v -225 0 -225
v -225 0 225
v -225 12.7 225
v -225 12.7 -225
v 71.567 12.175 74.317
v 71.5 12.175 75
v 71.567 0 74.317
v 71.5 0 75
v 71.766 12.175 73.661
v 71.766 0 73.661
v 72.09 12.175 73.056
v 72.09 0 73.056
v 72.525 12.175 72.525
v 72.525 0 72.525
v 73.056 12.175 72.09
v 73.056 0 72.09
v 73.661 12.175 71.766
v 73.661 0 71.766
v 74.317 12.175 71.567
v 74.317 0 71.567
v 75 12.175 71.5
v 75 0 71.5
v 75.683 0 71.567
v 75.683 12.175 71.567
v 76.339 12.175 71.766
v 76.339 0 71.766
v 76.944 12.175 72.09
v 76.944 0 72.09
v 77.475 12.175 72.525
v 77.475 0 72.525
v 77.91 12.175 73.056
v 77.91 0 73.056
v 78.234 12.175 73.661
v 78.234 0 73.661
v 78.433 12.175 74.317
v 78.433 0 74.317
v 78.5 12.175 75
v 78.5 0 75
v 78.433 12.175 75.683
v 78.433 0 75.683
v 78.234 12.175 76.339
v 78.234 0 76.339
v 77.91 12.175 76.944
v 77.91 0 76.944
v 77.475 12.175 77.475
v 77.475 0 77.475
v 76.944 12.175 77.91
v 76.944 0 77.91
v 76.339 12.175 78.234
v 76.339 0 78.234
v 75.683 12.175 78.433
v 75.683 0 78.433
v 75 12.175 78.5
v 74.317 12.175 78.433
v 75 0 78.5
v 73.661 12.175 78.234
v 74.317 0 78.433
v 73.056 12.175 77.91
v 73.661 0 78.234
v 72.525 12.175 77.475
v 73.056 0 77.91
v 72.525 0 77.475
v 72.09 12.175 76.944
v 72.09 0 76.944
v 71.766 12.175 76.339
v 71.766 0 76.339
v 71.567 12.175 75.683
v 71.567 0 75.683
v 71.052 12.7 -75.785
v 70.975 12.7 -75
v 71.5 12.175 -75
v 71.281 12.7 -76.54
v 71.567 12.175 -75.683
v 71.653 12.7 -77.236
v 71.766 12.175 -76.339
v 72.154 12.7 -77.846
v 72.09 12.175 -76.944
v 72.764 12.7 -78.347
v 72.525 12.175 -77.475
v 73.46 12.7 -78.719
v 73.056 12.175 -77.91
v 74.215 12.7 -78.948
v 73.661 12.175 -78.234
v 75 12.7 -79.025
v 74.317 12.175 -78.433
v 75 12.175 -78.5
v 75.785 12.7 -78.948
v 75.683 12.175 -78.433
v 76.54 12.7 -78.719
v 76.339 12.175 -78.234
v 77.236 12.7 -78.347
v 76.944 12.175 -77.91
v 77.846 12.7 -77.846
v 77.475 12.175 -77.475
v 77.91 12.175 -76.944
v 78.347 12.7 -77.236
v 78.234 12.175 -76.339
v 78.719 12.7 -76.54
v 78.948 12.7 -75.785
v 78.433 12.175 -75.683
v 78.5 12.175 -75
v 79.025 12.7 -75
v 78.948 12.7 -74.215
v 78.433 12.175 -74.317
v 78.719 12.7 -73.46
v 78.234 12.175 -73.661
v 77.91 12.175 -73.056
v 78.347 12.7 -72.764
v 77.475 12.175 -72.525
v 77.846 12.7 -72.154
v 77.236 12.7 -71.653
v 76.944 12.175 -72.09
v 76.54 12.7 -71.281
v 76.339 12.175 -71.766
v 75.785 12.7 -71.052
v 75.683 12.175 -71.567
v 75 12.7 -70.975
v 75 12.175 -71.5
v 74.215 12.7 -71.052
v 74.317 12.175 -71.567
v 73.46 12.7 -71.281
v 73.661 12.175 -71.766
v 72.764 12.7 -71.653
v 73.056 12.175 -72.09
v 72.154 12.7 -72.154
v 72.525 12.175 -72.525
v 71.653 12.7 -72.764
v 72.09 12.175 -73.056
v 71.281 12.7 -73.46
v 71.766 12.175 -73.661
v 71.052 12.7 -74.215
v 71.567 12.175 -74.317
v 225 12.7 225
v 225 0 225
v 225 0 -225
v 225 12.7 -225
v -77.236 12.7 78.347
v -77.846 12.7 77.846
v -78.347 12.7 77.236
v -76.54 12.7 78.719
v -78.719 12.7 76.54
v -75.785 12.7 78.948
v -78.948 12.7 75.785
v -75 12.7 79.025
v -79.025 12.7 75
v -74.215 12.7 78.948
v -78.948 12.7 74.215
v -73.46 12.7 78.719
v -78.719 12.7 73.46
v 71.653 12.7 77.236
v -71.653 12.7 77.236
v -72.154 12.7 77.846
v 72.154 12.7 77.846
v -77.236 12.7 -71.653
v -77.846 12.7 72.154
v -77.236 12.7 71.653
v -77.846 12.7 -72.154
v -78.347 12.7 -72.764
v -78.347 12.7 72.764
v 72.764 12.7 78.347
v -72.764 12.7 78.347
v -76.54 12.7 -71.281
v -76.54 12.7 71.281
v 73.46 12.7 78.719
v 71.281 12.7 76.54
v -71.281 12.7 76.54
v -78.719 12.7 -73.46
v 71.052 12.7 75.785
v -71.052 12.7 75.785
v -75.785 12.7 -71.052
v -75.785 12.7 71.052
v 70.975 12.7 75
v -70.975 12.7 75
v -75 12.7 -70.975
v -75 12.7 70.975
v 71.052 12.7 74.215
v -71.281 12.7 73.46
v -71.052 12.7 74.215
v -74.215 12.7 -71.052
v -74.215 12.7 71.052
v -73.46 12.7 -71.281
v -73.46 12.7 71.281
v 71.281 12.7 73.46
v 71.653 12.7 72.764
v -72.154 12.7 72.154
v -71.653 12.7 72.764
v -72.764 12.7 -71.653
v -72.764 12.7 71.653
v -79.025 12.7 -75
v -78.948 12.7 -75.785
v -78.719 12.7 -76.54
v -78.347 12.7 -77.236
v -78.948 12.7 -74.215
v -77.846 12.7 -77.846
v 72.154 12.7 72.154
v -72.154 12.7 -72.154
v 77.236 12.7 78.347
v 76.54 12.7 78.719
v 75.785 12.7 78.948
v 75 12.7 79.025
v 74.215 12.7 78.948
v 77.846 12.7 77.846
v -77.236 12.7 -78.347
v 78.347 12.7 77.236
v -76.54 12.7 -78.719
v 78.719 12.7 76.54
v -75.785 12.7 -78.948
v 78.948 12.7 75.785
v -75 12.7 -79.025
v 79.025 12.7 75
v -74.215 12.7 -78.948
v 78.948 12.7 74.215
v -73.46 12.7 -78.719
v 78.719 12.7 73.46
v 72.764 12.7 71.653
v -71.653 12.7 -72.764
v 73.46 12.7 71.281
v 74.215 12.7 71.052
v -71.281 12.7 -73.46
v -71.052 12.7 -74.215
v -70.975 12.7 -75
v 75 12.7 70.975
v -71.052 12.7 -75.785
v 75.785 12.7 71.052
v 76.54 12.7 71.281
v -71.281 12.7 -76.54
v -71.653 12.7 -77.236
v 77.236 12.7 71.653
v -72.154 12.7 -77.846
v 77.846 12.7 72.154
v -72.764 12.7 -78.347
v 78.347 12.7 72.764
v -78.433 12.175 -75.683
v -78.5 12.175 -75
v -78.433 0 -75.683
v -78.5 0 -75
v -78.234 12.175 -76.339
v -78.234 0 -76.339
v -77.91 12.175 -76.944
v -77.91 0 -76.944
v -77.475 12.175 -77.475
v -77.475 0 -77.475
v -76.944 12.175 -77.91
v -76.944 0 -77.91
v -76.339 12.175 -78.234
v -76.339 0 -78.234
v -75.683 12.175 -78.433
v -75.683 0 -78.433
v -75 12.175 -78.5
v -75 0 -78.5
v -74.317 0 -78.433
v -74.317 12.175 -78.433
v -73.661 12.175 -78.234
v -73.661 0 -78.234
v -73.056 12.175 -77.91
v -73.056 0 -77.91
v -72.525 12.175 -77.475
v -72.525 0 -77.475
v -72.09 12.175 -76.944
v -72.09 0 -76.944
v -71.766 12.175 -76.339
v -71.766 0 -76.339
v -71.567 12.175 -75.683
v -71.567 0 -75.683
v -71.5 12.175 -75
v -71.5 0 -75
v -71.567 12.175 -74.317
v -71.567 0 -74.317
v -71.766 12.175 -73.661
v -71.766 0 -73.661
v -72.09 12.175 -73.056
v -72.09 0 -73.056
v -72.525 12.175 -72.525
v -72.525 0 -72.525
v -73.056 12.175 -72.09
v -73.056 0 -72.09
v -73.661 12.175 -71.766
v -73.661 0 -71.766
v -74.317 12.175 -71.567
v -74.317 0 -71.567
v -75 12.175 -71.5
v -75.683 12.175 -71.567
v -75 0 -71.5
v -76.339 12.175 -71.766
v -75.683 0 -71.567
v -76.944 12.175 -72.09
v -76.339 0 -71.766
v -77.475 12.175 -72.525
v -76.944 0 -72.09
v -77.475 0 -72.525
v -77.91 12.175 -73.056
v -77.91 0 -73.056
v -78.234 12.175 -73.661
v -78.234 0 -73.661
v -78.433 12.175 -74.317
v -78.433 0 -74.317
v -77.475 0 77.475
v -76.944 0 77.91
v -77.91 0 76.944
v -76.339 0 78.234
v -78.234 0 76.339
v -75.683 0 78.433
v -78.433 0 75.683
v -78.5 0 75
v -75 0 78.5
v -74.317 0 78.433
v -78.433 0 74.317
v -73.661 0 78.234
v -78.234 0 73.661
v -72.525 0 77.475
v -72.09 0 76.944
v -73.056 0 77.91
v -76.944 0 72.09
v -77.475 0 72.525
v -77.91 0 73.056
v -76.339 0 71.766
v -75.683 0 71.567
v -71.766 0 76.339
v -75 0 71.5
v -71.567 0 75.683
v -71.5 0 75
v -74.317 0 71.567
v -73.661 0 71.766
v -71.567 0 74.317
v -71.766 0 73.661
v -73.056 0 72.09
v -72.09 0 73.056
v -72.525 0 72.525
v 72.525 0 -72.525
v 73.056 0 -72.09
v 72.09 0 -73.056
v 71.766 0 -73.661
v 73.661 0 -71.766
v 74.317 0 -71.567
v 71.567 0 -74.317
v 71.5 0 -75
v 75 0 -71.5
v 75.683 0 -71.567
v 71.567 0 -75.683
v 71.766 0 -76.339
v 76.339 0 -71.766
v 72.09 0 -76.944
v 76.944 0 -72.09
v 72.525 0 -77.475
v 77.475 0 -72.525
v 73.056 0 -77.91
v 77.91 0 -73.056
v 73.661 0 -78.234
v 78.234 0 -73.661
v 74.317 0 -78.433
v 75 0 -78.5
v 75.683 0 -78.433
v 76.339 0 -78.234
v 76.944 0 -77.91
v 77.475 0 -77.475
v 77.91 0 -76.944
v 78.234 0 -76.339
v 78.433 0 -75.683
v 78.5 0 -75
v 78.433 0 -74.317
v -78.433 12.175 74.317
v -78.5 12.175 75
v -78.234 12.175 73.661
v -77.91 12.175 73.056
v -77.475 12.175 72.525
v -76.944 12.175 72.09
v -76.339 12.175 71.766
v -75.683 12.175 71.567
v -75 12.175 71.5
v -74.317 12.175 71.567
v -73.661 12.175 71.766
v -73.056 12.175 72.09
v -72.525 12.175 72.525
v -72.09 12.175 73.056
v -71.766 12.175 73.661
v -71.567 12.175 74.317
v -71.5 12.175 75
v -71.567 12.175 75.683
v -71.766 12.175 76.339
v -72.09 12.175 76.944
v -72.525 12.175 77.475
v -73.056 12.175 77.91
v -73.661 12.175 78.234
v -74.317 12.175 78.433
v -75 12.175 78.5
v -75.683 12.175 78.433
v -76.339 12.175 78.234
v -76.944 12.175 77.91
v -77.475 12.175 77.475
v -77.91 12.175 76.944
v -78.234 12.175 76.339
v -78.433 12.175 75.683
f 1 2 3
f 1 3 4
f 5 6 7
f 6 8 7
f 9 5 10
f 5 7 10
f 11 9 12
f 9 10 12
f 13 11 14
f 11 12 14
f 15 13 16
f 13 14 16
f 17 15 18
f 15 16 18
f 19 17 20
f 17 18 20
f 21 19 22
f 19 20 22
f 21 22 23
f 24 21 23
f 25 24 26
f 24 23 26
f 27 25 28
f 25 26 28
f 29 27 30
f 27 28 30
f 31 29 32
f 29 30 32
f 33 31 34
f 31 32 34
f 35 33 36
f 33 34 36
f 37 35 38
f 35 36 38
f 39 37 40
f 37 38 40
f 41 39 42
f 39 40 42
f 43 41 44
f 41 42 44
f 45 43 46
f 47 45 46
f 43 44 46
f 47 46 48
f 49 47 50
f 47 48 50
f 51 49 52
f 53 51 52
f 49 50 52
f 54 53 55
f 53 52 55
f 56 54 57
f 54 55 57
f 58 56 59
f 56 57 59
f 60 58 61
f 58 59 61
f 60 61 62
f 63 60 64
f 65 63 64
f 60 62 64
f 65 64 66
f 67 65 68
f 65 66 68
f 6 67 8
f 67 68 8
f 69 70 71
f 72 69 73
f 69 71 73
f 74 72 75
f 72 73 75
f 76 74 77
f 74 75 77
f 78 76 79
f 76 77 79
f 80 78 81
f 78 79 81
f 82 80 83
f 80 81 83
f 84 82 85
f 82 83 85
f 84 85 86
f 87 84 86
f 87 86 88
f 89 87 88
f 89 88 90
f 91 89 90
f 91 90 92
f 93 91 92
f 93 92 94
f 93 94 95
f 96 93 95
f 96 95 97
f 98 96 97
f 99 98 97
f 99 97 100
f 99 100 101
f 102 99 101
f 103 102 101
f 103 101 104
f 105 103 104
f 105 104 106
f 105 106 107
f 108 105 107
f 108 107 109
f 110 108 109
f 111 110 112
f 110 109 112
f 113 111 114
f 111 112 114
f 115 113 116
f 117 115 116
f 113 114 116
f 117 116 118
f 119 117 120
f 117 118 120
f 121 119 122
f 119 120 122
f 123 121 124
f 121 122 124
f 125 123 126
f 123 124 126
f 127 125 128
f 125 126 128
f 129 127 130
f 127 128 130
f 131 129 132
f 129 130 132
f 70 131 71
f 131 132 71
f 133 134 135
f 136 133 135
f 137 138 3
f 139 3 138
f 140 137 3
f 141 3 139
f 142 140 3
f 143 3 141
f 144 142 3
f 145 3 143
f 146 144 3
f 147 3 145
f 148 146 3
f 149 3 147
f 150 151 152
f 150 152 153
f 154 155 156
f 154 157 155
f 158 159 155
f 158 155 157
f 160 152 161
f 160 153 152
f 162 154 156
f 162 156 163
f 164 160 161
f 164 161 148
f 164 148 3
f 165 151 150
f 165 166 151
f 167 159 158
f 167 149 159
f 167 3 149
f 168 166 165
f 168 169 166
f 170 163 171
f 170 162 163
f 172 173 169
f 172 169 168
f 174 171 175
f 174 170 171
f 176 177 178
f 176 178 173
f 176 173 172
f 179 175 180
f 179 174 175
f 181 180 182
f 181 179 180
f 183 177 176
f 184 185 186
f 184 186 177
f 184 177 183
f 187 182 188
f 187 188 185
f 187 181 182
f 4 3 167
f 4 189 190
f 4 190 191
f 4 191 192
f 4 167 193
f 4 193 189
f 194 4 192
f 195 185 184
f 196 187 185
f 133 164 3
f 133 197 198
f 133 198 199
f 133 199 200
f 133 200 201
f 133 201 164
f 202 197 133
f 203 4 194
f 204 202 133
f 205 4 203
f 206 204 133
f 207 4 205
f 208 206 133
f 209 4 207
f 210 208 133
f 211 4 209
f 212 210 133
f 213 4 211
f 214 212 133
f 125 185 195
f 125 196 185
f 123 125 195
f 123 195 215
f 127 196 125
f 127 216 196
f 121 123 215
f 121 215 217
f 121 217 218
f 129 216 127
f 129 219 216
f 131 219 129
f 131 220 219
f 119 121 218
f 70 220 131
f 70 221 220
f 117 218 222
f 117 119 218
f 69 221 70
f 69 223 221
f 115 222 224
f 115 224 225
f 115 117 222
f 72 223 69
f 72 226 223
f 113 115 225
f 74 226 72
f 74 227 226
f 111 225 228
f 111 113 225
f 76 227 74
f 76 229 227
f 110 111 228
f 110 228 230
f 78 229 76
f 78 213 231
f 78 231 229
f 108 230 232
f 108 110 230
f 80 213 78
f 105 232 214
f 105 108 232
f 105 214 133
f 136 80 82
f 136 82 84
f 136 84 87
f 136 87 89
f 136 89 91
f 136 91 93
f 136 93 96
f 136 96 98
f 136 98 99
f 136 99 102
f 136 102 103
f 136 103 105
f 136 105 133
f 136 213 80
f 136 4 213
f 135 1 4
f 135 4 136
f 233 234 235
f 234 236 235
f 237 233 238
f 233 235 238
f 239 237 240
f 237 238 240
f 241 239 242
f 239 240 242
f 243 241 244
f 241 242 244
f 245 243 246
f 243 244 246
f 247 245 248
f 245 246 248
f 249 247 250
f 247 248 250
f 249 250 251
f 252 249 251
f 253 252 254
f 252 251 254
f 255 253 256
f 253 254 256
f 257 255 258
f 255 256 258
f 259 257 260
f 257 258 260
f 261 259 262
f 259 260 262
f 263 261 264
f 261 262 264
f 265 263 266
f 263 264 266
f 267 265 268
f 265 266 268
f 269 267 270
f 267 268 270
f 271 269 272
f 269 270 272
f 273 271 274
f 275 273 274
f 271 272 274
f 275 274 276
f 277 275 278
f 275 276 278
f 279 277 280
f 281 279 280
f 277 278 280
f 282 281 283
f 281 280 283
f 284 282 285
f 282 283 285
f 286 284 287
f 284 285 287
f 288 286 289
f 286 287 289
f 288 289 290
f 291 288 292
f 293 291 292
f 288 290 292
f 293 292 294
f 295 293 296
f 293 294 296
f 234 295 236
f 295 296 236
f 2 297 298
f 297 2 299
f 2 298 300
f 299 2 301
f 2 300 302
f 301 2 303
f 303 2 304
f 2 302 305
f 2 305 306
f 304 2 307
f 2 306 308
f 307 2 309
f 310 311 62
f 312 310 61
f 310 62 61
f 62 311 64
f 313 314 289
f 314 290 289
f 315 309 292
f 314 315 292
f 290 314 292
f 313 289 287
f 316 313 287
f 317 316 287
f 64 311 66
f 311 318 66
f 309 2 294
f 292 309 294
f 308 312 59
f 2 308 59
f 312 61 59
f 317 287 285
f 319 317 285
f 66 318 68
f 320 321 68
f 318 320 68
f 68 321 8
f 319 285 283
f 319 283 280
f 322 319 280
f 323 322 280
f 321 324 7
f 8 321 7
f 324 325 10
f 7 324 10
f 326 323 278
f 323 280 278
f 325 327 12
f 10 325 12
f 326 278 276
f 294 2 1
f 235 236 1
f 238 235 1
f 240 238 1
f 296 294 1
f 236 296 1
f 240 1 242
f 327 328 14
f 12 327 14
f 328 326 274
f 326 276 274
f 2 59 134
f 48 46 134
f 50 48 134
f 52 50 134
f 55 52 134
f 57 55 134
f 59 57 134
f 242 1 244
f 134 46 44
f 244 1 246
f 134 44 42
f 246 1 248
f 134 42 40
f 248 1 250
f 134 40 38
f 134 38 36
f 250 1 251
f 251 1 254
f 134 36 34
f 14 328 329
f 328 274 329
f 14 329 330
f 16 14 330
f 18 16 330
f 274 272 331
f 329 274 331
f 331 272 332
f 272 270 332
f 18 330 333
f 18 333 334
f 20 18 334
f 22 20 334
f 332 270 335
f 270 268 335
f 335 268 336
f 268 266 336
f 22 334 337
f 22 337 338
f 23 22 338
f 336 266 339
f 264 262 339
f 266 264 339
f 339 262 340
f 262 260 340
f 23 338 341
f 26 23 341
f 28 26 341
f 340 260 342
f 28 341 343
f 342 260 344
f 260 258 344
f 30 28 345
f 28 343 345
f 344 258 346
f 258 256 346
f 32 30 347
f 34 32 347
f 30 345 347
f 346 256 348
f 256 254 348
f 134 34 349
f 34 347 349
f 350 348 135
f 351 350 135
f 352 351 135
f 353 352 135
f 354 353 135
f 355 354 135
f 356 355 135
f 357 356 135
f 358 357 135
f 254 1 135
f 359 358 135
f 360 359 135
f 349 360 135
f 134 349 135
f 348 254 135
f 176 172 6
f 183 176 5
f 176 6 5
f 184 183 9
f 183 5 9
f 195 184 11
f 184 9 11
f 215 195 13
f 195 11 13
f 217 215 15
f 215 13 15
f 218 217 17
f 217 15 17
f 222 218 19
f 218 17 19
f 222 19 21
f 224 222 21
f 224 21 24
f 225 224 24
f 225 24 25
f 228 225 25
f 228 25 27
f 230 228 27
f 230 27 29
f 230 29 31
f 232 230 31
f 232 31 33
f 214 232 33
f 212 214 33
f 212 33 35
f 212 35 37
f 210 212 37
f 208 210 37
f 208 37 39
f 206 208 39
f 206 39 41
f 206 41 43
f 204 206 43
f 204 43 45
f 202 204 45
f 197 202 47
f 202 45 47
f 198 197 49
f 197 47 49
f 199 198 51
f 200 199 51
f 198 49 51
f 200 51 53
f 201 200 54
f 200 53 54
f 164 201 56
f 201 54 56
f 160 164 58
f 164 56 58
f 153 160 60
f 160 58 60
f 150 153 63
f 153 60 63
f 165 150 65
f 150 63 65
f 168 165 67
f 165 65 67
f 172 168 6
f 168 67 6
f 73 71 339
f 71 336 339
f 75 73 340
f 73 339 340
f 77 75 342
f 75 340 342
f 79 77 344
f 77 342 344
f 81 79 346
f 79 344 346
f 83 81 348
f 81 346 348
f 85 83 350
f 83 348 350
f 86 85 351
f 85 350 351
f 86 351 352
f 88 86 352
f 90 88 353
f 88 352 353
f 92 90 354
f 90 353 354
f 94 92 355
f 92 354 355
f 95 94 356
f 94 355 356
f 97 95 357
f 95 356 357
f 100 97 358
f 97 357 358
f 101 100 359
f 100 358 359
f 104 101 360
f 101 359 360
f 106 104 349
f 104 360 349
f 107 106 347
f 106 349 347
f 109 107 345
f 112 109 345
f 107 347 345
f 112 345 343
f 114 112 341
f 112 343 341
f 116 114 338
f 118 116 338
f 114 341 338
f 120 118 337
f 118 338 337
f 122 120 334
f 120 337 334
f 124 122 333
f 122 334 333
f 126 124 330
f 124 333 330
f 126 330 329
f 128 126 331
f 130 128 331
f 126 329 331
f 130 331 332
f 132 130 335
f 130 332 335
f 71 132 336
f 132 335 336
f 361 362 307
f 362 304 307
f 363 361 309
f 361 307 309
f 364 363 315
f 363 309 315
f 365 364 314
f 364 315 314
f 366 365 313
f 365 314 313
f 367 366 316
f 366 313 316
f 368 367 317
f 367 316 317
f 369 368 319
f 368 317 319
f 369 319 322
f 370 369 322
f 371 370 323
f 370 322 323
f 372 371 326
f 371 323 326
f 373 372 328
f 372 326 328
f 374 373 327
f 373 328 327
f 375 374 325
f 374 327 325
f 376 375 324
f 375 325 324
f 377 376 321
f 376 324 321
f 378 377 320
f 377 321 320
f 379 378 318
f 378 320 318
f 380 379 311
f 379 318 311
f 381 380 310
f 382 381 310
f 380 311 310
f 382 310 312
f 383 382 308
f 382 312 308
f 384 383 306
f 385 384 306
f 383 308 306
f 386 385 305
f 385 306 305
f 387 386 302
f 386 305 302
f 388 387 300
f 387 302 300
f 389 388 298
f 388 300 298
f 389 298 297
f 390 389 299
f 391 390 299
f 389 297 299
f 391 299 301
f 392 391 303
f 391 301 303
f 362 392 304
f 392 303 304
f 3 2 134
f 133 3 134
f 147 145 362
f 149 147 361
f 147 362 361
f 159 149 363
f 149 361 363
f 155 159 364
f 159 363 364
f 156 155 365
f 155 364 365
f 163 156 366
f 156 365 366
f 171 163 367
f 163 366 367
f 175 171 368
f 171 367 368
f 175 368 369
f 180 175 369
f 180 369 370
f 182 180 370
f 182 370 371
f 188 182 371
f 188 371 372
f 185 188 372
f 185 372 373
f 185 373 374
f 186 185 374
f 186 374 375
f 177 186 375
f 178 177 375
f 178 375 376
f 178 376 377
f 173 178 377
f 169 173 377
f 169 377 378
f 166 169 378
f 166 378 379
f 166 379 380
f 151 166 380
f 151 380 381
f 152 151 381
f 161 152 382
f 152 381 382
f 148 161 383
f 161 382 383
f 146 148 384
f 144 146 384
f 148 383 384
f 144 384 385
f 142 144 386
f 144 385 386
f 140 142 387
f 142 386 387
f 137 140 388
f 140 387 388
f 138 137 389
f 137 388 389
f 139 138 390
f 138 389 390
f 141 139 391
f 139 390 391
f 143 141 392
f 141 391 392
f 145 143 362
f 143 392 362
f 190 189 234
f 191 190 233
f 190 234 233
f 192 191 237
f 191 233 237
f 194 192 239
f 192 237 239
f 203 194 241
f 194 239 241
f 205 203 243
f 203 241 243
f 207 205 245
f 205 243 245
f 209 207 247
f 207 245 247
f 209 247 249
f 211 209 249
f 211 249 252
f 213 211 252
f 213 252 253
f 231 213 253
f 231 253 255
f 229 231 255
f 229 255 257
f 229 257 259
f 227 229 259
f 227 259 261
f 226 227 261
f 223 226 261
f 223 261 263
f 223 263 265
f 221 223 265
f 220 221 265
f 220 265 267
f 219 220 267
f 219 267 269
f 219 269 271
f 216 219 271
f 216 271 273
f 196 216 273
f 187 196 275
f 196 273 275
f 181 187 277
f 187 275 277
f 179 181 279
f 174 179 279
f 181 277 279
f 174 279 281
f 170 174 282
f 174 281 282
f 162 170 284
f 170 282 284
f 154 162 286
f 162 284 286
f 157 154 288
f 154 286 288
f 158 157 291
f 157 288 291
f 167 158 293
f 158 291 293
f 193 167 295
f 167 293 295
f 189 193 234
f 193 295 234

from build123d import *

# Parameters (mm, degrees)
ESBO_O1_W                           = 450
ESBO_O1_H                           = 450
RESSALTO_EXTRUS_O1_DEPTH            = 12.7
FURO_ROSCADO_DE_M8X1_01_D           = 7
FURO_ROSCADO_DE_M8X1_01_CSINK_D     = 8.05
FURO_ROSCADO_DE_M8X1_01_CSINK_ANGLE = 90


with BuildPart() as part:
    # Esboço1 → Ressalto-extrusão1 (new body)
    with BuildSketch(Plane(origin=(0, 0, 0), x_dir=(1, 0, 0), z_dir=(0, 1, 0))):
        Rectangle(ESBO_O1_W, ESBO_O1_H)
    extrude(amount=RESSALTO_EXTRUS_O1_DEPTH)

    # Furo roscado de M8x1.01 (through all)
    with Locations(Plane(origin=(0, 12.7, 0), x_dir=(1, 0, 0), z_dir=(0, 1, 0))):
        with Locations((-75, 75), (75, 75), (75, -75), (-75, -75)):
            CounterSinkHole(FURO_ROSCADO_DE_M8X1_01_D / 2, FURO_ROSCADO_DE_M8X1_01_CSINK_D / 2, counter_sink_angle=FURO_ROSCADO_DE_M8X1_01_CSINK_ANGLE)


solid = part.part
